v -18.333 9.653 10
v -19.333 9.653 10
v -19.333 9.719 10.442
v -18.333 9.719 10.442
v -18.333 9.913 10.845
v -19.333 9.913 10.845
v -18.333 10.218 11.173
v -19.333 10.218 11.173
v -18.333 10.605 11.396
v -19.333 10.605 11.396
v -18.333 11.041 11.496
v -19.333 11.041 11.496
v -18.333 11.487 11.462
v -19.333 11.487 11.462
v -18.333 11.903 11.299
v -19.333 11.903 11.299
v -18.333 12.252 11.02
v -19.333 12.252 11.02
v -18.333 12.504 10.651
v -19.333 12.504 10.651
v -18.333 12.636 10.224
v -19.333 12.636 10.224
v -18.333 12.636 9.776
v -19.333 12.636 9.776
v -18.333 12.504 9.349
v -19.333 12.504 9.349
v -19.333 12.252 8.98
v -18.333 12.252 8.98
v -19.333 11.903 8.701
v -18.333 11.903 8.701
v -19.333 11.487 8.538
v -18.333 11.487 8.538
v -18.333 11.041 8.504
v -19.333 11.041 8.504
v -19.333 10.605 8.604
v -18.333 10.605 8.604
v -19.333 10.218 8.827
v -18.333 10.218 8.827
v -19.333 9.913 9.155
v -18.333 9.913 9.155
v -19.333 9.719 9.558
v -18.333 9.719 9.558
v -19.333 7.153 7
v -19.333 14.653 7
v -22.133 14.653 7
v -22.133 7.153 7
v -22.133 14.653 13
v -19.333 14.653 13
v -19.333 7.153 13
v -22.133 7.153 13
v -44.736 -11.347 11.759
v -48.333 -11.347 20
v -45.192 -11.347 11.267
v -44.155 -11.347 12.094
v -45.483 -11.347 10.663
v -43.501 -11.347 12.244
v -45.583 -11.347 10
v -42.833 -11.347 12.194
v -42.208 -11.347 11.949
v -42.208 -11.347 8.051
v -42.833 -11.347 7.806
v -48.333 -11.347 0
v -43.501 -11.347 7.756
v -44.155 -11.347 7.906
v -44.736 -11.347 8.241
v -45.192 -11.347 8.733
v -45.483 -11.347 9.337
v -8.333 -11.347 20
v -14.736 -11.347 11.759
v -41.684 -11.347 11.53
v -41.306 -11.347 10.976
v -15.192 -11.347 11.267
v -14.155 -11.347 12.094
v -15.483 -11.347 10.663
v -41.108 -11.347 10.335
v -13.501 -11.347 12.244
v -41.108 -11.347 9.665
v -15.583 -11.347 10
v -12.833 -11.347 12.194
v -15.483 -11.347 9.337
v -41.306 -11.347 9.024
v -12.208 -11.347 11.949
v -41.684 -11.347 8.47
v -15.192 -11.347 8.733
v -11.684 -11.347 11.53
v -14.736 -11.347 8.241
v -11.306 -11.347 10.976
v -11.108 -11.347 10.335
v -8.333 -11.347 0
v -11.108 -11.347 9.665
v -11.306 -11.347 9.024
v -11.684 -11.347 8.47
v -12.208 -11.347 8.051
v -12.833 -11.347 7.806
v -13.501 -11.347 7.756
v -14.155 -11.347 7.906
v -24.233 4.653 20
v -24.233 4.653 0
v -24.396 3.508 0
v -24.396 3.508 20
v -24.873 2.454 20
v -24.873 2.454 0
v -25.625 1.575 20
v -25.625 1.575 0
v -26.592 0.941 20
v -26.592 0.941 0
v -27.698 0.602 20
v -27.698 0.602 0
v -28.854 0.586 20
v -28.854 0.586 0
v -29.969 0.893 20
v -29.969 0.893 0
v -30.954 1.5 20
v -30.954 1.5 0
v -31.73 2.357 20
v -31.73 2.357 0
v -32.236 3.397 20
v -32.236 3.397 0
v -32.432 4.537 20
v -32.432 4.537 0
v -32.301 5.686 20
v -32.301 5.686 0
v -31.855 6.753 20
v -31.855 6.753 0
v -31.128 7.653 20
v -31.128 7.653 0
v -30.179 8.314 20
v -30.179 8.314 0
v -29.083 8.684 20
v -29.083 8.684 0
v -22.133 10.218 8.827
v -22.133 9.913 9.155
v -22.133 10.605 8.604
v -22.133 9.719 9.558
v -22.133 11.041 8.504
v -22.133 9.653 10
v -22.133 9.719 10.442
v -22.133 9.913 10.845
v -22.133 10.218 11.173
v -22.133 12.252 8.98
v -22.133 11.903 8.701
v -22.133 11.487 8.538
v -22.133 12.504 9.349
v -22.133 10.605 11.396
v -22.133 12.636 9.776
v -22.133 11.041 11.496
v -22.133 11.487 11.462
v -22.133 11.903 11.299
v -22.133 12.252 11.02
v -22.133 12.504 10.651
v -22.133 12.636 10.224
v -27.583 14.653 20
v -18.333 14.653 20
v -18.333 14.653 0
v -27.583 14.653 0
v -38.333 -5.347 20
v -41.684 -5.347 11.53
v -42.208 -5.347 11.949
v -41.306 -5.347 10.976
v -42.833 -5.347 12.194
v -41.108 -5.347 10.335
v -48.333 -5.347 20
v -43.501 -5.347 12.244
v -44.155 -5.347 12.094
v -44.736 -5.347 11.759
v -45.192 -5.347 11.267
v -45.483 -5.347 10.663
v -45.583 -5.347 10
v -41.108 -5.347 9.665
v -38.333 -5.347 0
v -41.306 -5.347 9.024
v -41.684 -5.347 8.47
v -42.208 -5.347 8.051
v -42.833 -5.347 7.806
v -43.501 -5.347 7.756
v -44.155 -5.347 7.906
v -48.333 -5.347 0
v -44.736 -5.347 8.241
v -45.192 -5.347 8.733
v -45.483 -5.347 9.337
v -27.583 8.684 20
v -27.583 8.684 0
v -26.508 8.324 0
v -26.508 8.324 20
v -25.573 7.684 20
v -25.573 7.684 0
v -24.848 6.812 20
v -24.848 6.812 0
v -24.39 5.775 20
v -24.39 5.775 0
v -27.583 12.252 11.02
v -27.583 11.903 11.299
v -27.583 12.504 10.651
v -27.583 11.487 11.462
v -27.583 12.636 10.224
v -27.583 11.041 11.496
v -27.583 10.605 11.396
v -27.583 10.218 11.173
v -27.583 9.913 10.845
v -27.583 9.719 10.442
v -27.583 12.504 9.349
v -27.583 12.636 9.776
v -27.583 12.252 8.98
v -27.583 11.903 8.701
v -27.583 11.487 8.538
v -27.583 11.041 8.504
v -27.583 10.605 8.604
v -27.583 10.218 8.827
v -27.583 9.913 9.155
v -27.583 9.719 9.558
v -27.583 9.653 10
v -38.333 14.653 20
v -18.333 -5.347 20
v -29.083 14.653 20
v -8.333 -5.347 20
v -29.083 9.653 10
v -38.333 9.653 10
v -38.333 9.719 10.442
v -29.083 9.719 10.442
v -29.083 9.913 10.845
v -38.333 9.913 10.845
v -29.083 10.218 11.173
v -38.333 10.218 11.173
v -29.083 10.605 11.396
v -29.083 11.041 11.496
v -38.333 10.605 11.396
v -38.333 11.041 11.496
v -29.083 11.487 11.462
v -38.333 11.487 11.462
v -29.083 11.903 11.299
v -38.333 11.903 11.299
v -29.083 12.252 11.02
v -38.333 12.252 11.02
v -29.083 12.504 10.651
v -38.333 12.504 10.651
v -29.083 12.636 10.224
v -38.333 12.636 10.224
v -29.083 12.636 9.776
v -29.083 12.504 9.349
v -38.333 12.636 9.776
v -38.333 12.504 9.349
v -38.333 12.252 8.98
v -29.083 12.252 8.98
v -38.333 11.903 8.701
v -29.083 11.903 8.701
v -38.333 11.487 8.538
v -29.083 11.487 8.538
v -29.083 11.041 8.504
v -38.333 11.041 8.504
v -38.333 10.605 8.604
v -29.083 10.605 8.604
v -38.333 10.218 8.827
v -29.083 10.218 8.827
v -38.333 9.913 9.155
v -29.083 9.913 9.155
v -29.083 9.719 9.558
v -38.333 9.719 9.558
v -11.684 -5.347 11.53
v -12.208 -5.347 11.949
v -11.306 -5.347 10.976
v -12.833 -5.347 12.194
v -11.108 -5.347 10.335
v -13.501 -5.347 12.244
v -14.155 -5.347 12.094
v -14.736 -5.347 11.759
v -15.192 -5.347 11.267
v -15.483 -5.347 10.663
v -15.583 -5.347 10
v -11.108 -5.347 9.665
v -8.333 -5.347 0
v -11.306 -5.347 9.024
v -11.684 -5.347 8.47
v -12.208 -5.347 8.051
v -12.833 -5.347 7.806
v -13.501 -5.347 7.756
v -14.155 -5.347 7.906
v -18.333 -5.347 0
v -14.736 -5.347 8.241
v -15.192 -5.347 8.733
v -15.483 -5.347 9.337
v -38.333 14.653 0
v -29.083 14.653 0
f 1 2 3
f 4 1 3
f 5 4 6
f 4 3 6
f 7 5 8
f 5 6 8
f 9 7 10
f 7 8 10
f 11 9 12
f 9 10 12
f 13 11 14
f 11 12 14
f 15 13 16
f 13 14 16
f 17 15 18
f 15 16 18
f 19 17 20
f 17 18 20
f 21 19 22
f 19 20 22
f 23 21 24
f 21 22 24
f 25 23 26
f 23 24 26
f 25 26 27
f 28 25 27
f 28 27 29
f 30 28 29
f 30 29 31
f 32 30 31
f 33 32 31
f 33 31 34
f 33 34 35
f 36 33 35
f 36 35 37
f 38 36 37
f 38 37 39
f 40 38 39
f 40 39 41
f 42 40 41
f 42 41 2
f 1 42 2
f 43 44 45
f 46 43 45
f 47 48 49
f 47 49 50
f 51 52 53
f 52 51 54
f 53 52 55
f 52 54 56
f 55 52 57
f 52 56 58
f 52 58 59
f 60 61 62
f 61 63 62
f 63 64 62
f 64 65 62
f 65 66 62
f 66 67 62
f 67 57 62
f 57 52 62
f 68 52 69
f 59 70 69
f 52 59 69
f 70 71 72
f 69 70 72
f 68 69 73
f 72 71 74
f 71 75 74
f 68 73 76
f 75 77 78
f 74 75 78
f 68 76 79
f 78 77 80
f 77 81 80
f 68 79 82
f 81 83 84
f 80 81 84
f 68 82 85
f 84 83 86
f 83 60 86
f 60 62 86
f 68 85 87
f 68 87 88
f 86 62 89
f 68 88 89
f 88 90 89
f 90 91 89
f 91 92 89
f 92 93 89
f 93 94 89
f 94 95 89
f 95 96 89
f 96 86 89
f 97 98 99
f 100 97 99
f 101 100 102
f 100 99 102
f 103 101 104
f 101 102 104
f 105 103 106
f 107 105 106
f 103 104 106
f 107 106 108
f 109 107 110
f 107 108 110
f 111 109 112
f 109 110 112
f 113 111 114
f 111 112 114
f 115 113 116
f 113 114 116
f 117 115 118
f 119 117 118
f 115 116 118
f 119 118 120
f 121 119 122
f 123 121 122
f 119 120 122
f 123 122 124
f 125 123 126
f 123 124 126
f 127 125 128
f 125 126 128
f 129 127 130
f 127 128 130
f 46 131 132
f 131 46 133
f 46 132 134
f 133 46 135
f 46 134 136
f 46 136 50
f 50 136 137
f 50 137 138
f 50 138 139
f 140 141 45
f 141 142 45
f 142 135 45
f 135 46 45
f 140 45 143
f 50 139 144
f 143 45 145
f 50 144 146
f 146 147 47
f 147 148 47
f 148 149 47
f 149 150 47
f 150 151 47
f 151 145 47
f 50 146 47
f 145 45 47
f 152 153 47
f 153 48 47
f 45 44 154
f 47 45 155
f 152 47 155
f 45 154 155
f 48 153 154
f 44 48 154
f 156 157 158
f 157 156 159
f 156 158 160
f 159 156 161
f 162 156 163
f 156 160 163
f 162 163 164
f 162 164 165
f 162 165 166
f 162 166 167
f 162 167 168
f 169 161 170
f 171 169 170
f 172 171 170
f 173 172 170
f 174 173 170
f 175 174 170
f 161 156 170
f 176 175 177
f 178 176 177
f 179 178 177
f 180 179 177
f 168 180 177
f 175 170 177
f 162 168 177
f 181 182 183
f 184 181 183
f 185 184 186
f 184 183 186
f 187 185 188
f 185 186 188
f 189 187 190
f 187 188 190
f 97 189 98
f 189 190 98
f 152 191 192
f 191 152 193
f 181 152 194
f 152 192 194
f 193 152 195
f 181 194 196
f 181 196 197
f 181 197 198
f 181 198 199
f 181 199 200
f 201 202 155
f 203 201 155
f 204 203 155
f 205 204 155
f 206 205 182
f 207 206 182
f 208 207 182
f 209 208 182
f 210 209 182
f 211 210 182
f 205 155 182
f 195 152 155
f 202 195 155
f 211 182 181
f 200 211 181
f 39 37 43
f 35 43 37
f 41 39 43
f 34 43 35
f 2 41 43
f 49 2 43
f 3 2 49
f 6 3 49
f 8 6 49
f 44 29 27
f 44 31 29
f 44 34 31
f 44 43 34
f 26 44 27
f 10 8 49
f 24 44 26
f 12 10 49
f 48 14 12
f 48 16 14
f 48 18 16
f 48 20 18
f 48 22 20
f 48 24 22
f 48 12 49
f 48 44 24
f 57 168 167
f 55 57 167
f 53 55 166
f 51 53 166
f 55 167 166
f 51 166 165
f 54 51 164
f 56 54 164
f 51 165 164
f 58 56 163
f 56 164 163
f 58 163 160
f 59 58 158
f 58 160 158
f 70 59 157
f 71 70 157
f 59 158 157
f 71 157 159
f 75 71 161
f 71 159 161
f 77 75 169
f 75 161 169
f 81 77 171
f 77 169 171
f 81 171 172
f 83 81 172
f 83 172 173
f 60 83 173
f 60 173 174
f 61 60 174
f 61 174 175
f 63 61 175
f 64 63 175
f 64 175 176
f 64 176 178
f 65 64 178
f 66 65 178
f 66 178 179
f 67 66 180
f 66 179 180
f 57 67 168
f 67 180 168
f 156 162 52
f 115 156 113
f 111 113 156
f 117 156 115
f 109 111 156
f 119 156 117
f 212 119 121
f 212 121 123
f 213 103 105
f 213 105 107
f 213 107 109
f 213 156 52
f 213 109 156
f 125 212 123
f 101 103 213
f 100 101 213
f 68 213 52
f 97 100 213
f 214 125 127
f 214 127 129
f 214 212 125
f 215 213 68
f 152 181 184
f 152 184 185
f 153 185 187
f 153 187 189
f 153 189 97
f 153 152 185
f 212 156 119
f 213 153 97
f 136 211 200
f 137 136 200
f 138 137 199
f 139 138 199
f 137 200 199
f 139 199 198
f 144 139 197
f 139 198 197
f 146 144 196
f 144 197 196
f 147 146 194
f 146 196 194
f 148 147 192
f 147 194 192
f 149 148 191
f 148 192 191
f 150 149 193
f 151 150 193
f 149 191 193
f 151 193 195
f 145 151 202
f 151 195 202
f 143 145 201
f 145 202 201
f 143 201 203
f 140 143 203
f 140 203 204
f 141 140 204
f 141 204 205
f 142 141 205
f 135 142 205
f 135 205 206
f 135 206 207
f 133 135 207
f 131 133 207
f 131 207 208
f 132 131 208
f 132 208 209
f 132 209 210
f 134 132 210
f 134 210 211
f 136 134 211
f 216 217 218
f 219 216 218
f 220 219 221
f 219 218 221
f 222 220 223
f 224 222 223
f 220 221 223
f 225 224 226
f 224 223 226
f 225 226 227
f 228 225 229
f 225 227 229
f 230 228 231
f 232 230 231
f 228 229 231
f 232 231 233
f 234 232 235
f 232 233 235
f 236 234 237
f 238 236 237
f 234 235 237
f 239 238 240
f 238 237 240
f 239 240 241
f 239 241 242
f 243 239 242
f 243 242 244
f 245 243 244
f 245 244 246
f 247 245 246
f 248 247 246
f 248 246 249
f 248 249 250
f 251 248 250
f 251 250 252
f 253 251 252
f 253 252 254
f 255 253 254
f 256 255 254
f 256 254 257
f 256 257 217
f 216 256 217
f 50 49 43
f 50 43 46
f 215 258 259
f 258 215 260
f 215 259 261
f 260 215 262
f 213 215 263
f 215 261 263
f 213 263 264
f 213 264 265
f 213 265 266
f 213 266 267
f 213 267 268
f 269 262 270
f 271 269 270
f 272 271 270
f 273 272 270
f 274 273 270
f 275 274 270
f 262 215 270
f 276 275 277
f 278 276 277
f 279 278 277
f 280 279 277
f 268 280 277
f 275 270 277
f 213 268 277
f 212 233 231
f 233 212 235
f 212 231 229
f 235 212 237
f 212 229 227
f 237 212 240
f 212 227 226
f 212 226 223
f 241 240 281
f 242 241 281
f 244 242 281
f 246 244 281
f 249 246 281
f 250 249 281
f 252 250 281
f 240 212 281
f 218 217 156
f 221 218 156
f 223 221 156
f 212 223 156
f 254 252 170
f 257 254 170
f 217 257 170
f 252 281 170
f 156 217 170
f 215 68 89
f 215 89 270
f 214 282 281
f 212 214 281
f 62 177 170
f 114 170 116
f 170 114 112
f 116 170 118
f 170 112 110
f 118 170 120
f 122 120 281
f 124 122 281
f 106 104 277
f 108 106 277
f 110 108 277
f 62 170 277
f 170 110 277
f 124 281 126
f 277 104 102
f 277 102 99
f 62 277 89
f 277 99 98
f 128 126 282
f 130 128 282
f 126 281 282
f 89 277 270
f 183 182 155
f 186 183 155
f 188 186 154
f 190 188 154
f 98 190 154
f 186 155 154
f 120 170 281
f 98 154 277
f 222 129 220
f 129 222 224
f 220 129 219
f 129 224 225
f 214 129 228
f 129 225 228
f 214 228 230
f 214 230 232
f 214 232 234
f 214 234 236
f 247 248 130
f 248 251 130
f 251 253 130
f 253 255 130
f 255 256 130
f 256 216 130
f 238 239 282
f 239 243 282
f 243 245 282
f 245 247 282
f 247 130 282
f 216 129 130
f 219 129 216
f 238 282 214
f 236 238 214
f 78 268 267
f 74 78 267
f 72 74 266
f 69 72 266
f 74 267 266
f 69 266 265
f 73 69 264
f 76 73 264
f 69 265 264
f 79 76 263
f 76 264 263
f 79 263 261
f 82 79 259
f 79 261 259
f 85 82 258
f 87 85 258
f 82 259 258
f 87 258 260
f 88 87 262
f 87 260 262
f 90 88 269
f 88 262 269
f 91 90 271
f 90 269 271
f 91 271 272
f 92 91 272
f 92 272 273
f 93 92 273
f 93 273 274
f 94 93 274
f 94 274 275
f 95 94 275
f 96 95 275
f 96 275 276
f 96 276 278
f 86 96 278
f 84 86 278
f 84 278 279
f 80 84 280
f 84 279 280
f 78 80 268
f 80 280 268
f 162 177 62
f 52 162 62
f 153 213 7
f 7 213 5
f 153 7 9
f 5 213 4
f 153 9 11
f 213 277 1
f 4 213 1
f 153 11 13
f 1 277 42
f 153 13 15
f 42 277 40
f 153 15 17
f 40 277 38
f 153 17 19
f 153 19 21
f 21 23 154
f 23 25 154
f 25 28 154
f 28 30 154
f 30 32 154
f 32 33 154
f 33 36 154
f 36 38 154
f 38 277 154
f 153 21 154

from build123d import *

# Parameters (mm, degrees)
F1_DEPTH = 20
F2_R     = 1.5
F3_DEPTH = 20
F4_W     = 2.8
F4_H     = 6
F5_DEPTH = 7.5
F6_R     = 2.25
F7_DEPTH = 6


with BuildPart() as f1:
    # F0 (on Top) → F1 (new body)
    with BuildSketch(Plane.XY):
        with BuildLine():
            Line((-38.333333, 14.652778), (-38.333333, -5.347222))
            Line((-38.333333, -5.347222), (-18.333333, -5.347222))
            Line((-18.333333, -5.347222), (-18.333333, 14.652778))
            Line((-18.333333, 14.652778), (-27.583333, 14.652778))
            Line((-27.583333, 14.652778), (-27.583333, 8.683597))
            ThreePointArc((-27.583333, 8.683597), (-25.18016, 7.273369), (-24.233333, 4.652778))
            ThreePointArc((-24.233333, 4.652778), (-30.953925, 1.499605), (-29.083333, 8.683597))
            Line((-29.083333, 8.683597), (-29.083333, 14.652778))
            Line((-29.083333, 14.652778), (-38.333333, 14.652778))
        make_face()
        Polygon((-48.333333, -5.347222), (-48.333333, -11.347222), (-8.333333, -11.347222), (-8.333333, -5.347222), (-18.333333, -5.347222), (-38.333333, -5.347222), align=None)
    extrude(amount=F1_DEPTH)

    # F2 (on face) → F3 (cut)
    with BuildSketch(Plane(origin=(-38.333333, 0, 0), x_dir=(0, -1, 0), z_dir=(-1, 0, 0))):
        with Locations((-11.152778, 10)):
            Circle(F2_R)
    extrude(amount=-F3_DEPTH, mode=Mode.SUBTRACT)

    # F4 (on face) → F5 (cut)
    with BuildSketch(Plane(origin=(0, 14.652778, 0), x_dir=(-1, 0, 0), z_dir=(0, 1, 0))):
        with Locations((20.733333, 10)):
            Rectangle(F4_W, F4_H)
    extrude(amount=-F5_DEPTH, mode=Mode.SUBTRACT)

    # F6 (on face) → F7 (cut)
    with BuildSketch(Plane(origin=(0, -5.347222, 0), x_dir=(-1, 0, 0), z_dir=(0, 1, 0))):
        with Locations((43.333333, 10)):
            Circle(F6_R)
        with Locations((13.333333, 10)):
            Circle(F6_R)
    extrude(amount=-F7_DEPTH, mode=Mode.SUBTRACT)


solid = f1.part
